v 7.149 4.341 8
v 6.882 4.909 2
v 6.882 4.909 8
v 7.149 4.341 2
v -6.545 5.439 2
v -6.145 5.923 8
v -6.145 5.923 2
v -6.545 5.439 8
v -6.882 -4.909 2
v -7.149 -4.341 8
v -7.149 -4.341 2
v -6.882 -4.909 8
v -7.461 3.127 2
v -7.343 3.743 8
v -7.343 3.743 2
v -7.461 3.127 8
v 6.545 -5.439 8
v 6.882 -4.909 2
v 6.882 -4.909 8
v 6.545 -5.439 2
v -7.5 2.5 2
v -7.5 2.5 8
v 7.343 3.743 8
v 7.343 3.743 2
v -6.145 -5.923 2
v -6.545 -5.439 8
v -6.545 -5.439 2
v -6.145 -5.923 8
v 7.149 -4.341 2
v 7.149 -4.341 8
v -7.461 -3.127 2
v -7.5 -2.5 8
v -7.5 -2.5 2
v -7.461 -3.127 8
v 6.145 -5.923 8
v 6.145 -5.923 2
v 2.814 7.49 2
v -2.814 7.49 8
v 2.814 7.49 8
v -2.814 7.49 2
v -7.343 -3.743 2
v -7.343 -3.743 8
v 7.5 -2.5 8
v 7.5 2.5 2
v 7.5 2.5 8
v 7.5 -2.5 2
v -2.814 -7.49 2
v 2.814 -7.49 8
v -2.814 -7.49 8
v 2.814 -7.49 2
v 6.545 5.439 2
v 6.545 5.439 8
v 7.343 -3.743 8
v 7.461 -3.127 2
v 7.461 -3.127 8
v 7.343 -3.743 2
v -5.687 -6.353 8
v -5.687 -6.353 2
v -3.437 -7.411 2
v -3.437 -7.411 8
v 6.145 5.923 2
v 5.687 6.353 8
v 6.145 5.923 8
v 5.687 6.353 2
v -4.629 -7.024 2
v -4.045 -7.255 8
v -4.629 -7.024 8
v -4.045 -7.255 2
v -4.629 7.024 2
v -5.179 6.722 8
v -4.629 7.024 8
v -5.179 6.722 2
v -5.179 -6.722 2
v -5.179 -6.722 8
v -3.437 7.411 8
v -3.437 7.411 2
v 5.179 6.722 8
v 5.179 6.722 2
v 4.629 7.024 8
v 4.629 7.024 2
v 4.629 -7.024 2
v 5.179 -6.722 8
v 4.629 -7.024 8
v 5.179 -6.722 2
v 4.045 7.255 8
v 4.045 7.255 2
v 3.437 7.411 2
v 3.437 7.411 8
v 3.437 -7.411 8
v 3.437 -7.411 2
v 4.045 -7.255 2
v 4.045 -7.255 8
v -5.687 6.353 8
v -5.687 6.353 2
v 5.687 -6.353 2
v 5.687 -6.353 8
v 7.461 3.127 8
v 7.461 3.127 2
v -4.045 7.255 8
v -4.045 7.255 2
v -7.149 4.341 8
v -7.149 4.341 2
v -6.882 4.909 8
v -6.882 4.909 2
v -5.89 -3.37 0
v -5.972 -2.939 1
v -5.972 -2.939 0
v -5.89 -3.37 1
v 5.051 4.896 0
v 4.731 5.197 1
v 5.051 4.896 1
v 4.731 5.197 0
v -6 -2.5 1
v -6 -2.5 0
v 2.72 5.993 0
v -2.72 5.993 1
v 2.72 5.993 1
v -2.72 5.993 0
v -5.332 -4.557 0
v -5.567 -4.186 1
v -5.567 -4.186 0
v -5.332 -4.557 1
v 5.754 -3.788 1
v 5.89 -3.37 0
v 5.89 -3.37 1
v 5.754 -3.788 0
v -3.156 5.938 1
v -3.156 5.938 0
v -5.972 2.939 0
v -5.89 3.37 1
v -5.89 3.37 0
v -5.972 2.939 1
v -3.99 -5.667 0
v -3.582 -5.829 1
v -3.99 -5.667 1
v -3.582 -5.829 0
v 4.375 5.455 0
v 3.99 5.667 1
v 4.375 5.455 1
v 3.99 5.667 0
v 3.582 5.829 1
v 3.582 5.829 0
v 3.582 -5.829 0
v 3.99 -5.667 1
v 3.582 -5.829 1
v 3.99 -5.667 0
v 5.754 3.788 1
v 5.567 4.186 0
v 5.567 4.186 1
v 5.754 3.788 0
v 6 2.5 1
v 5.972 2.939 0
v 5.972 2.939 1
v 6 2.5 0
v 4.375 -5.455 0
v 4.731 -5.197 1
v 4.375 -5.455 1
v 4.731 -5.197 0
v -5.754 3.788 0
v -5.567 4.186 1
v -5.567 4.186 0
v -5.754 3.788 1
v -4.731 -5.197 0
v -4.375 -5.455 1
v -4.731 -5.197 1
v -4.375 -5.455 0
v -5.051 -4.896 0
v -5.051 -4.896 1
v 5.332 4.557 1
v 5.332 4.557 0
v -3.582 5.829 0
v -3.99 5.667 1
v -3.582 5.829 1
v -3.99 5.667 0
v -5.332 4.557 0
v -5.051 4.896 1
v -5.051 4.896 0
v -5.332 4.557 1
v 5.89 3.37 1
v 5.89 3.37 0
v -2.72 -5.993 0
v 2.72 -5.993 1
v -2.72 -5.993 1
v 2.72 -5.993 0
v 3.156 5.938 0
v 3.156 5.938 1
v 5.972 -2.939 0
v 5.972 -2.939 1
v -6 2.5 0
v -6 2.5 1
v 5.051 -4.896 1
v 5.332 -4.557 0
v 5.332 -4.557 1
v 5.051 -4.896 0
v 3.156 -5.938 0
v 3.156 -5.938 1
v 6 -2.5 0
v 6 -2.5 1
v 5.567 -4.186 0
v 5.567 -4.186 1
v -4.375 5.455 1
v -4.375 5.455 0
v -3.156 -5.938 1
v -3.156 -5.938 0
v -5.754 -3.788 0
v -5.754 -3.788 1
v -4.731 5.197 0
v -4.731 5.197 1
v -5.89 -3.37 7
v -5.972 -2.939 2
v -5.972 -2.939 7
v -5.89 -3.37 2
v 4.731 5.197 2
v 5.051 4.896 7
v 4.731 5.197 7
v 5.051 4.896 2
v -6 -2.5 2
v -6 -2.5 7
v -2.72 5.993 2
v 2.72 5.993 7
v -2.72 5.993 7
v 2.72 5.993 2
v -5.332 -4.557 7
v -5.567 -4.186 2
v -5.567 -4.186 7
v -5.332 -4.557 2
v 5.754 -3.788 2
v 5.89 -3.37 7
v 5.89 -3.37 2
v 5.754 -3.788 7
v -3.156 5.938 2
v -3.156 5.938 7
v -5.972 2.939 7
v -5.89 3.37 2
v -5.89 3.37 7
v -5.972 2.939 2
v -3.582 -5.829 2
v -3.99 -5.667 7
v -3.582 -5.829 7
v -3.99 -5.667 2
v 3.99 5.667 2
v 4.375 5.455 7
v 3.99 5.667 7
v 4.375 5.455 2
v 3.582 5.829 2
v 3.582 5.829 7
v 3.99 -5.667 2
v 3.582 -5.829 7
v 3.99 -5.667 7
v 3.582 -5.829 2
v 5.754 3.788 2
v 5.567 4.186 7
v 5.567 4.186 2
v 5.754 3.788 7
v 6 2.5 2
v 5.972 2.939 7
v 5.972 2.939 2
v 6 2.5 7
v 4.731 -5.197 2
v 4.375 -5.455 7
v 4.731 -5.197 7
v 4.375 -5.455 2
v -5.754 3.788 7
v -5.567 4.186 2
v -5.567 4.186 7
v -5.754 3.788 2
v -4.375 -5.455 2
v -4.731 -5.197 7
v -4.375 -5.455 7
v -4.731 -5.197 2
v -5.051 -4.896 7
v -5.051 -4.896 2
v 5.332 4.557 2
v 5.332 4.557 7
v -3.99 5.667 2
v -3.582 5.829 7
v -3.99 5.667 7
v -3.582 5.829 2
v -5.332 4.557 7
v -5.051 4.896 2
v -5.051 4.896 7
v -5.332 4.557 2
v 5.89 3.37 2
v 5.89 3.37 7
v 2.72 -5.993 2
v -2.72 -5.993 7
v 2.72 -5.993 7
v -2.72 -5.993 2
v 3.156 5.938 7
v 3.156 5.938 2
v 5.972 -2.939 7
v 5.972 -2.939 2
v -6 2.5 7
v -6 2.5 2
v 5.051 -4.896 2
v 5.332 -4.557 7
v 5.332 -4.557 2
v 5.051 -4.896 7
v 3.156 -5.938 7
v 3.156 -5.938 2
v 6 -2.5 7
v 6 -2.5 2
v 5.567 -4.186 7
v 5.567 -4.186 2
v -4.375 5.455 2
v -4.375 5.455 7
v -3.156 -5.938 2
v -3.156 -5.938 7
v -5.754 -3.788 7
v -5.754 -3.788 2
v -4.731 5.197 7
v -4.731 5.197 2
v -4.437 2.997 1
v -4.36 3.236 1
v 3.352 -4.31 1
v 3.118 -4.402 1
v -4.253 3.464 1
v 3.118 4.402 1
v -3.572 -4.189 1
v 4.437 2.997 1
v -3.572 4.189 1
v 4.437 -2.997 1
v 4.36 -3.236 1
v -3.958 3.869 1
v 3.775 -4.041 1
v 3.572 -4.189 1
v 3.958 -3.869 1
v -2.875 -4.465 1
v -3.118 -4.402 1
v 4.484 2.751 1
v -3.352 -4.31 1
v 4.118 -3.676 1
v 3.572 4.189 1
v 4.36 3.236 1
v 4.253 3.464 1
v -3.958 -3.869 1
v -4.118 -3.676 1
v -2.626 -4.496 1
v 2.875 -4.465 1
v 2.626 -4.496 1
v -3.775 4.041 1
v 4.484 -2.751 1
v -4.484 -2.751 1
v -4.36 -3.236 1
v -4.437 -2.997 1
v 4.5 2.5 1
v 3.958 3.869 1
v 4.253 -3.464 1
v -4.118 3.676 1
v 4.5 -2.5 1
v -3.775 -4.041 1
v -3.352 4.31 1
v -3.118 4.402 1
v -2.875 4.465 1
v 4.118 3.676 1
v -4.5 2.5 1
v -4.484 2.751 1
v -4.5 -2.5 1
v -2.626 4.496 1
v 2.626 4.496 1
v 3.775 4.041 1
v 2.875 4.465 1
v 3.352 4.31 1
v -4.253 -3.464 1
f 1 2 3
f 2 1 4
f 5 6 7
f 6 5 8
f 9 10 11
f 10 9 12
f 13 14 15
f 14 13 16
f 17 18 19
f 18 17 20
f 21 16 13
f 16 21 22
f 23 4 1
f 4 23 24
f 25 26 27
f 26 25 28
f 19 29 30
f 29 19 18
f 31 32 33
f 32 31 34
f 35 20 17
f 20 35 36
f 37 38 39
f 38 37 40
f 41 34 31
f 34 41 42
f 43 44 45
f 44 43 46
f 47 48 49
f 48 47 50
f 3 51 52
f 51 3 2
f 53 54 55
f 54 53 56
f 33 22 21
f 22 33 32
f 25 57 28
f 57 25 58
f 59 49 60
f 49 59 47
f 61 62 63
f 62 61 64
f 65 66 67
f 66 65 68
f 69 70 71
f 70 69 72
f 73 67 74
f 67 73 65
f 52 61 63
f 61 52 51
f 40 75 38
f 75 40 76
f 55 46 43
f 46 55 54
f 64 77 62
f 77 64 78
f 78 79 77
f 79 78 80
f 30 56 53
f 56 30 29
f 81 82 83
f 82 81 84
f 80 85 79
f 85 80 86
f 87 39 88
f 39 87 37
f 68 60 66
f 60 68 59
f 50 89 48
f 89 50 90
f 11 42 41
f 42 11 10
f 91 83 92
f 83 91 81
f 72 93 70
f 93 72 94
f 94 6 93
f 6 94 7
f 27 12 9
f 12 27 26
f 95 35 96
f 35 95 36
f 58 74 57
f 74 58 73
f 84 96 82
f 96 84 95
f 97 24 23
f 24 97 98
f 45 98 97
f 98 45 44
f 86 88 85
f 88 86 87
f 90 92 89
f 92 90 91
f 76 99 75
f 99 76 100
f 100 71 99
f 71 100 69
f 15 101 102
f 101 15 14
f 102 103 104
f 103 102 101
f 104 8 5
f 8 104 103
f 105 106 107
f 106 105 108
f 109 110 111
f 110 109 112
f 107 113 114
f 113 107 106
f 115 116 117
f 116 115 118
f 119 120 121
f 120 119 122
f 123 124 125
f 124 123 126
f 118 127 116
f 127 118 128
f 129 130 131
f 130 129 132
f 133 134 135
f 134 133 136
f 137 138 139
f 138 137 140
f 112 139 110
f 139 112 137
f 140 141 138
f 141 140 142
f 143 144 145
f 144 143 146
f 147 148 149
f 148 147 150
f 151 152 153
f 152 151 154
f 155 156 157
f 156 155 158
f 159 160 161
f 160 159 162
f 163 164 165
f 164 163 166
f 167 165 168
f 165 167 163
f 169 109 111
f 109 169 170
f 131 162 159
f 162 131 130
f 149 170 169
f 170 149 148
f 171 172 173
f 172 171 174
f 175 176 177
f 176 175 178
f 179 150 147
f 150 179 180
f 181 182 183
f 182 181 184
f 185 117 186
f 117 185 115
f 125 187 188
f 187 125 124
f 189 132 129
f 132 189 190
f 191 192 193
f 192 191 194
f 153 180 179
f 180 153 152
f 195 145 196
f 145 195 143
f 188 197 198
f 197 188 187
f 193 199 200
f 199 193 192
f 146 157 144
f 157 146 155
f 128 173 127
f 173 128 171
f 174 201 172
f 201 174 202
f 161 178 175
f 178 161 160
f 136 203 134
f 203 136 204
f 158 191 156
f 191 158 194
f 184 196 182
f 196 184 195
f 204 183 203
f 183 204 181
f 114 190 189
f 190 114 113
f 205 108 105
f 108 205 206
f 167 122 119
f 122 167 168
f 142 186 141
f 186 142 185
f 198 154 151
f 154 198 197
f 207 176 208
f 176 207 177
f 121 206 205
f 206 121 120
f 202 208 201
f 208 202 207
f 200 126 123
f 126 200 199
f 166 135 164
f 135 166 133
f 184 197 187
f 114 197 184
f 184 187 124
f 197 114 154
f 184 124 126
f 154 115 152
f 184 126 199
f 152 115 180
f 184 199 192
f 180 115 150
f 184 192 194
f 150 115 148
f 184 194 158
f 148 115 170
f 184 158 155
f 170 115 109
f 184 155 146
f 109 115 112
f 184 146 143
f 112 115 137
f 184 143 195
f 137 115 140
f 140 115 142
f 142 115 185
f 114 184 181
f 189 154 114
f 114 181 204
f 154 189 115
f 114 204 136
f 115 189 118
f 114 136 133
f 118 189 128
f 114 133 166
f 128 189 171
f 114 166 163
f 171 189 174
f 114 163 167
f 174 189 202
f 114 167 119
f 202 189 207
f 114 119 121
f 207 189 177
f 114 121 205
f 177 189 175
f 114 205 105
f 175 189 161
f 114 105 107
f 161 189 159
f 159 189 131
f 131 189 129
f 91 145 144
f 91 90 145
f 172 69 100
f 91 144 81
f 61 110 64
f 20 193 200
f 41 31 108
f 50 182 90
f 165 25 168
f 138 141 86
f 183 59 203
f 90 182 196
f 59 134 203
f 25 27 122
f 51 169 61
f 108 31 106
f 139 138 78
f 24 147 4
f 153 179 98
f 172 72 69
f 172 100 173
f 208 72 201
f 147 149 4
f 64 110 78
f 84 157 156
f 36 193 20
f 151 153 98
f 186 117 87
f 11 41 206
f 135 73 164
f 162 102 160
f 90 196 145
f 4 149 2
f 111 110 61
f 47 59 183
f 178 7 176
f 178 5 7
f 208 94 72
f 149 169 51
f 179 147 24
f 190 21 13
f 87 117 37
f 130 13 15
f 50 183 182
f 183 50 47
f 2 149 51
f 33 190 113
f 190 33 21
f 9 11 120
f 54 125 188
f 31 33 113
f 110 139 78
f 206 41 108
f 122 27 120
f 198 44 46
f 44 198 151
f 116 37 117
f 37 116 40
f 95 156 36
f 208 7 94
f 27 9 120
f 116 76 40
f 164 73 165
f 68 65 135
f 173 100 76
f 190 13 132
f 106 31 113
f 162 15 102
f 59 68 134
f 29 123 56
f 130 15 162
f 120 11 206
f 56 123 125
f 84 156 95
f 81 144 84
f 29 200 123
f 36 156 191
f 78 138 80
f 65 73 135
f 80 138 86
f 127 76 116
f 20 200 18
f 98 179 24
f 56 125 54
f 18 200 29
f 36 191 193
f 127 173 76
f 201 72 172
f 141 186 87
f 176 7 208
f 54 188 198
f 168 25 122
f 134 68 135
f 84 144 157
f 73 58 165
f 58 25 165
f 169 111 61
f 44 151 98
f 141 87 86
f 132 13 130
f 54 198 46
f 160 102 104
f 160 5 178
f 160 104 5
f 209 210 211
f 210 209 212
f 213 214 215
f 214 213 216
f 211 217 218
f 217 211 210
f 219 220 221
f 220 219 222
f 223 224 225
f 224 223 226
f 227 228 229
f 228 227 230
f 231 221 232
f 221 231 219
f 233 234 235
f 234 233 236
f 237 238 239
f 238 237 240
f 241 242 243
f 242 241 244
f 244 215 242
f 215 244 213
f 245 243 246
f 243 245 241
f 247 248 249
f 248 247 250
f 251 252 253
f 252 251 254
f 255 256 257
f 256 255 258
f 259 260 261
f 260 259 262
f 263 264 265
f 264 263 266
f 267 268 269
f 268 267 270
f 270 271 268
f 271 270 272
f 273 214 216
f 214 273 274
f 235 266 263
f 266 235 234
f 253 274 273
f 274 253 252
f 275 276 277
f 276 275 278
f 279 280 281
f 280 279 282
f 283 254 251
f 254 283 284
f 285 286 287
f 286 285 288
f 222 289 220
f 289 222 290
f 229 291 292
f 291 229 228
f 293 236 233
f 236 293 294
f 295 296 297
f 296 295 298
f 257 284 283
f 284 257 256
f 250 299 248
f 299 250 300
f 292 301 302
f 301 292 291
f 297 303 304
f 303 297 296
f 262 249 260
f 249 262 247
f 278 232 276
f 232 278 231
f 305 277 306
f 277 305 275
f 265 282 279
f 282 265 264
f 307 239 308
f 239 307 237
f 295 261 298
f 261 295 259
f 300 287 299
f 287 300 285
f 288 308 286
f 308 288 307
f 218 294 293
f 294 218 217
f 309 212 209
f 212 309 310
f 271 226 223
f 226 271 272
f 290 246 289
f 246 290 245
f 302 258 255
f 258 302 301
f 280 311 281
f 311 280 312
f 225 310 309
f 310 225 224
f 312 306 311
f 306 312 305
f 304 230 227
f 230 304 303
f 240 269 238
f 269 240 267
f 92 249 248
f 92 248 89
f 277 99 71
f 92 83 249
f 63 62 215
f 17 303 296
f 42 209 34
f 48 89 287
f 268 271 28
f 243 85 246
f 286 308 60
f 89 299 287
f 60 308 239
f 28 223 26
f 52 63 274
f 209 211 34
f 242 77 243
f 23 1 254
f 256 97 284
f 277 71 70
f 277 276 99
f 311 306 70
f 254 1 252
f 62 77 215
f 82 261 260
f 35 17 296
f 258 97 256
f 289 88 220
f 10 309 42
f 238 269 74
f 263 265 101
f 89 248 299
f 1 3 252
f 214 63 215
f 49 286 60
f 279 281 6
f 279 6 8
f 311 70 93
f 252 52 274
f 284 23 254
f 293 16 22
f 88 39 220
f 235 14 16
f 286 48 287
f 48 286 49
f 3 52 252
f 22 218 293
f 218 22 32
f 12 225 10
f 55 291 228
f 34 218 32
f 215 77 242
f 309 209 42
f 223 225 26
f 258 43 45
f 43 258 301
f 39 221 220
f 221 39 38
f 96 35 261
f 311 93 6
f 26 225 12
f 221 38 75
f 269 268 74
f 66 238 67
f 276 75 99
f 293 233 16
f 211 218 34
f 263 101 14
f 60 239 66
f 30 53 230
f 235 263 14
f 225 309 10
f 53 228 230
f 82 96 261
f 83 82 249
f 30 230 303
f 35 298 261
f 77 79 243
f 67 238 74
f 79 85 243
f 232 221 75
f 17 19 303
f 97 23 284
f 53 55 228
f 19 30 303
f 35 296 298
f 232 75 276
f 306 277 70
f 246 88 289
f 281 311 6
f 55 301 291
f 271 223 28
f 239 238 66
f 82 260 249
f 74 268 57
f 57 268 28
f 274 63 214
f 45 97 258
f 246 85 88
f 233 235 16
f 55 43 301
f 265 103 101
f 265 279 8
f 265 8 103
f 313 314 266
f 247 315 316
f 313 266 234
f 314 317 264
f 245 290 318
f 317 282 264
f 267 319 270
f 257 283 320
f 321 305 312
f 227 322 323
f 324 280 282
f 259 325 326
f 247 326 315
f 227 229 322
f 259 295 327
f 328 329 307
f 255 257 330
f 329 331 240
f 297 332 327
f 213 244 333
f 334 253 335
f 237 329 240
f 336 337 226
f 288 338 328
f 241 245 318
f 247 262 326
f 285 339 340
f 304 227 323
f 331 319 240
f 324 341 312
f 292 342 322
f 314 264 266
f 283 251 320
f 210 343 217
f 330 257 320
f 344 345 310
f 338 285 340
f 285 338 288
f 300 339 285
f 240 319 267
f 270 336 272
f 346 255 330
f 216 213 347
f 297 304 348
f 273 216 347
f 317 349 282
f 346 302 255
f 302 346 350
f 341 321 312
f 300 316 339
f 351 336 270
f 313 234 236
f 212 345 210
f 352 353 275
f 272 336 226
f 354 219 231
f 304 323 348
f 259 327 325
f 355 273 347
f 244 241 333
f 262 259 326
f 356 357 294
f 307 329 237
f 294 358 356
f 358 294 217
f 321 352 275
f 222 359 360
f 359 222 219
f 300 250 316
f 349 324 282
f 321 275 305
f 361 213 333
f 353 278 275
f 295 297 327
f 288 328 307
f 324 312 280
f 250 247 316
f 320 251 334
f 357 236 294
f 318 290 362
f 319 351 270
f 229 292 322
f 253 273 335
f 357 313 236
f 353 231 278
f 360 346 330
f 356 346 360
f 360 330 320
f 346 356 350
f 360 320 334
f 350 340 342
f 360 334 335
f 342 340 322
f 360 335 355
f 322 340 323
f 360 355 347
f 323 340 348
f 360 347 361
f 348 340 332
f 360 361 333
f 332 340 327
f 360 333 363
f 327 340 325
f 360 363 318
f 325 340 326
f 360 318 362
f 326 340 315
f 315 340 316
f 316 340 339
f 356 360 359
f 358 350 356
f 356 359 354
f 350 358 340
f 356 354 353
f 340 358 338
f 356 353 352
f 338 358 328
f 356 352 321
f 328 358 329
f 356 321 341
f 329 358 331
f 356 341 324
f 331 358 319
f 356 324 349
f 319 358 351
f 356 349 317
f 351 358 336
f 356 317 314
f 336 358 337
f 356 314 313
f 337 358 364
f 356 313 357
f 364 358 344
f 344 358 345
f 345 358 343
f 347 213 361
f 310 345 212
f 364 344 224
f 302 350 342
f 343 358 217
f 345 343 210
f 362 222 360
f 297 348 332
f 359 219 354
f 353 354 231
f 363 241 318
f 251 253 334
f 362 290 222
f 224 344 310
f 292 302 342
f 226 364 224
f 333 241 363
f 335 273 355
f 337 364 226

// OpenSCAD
$fn = 50;


difference() {
	union() {
		translate(v = [0, 0, 2]) {
			hull() {
				translate(v = [-2.5000000000, 2.5000000000, 0]) {
					cylinder(h = 6, r = 5);
				}
				translate(v = [2.5000000000, 2.5000000000, 0]) {
					cylinder(h = 6, r = 5);
				}
				translate(v = [-2.5000000000, -2.5000000000, 0]) {
					cylinder(h = 6, r = 5);
				}
				translate(v = [2.5000000000, -2.5000000000, 0]) {
					cylinder(h = 6, r = 5);
				}
			}
		}
		hull() {
			translate(v = [-2.5000000000, 2.5000000000, 0]) {
				cylinder(h = 1, r = 3.5000000000);
			}
			translate(v = [2.5000000000, 2.5000000000, 0]) {
				cylinder(h = 1, r = 3.5000000000);
			}
			translate(v = [-2.5000000000, -2.5000000000, 0]) {
				cylinder(h = 1, r = 3.5000000000);
			}
			translate(v = [2.5000000000, -2.5000000000, 0]) {
				cylinder(h = 1, r = 3.5000000000);
			}
		}
		translate(v = [0, 0, 1]) {
			hull() {
				translate(v = [-2.5000000000, 2.5000000000, 0]) {
					cylinder(h = 1, r1 = 3.5000000000, r2 = 5.0000000000);
				}
				translate(v = [2.5000000000, 2.5000000000, 0]) {
					cylinder(h = 1, r1 = 3.5000000000, r2 = 5.0000000000);
				}
				translate(v = [-2.5000000000, -2.5000000000, 0]) {
					cylinder(h = 1, r1 = 3.5000000000, r2 = 5.0000000000);
				}
				translate(v = [2.5000000000, -2.5000000000, 0]) {
					cylinder(h = 1, r1 = 3.5000000000, r2 = 5.0000000000);
				}
			}
		}
	}
	union() {
		translate(v = [0, 0, 2]) {
			#hull() {
				translate(v = [-2.5000000000, 2.5000000000, 0]) {
					cylinder(h = 6, r = 3.5000000000);
				}
				translate(v = [2.5000000000, 2.5000000000, 0]) {
					cylinder(h = 6, r = 3.5000000000);
				}
				translate(v = [-2.5000000000, -2.5000000000, 0]) {
					cylinder(h = 6, r = 3.5000000000);
				}
				translate(v = [2.5000000000, -2.5000000000, 0]) {
					cylinder(h = 6, r = 3.5000000000);
				}
			}
		}
		translate(v = [0, 0, 7]) {
			hull() {
				translate(v = [-2.5000000000, 2.5000000000, 0]) {
					cylinder(h = 1, r1 = 3.5000000000, r2 = 5.0000000000);
				}
				translate(v = [2.5000000000, 2.5000000000, 0]) {
					cylinder(h = 1, r1 = 3.5000000000, r2 = 5.0000000000);
				}
				translate(v = [-2.5000000000, -2.5000000000, 0]) {
					cylinder(h = 1, r1 = 3.5000000000, r2 = 5.0000000000);
				}
				translate(v = [2.5000000000, -2.5000000000, 0]) {
					cylinder(h = 1, r1 = 3.5000000000, r2 = 5.0000000000);
				}
			}
		}
		translate(v = [0, 0, 1]) {
			#hull() {
				translate(v = [-2.5000000000, 2.5000000000, 0]) {
					cylinder(h = 1, r1 = 2.0000000000, r2 = 3.5000000000);
				}
				translate(v = [2.5000000000, 2.5000000000, 0]) {
					cylinder(h = 1, r1 = 2.0000000000, r2 = 3.5000000000);
				}
				translate(v = [-2.5000000000, -2.5000000000, 0]) {
					cylinder(h = 1, r1 = 2.0000000000, r2 = 3.5000000000);
				}
				translate(v = [2.5000000000, -2.5000000000, 0]) {
					cylinder(h = 1, r1 = 2.0000000000, r2 = 3.5000000000);
				}
			}
		}
	}
}
